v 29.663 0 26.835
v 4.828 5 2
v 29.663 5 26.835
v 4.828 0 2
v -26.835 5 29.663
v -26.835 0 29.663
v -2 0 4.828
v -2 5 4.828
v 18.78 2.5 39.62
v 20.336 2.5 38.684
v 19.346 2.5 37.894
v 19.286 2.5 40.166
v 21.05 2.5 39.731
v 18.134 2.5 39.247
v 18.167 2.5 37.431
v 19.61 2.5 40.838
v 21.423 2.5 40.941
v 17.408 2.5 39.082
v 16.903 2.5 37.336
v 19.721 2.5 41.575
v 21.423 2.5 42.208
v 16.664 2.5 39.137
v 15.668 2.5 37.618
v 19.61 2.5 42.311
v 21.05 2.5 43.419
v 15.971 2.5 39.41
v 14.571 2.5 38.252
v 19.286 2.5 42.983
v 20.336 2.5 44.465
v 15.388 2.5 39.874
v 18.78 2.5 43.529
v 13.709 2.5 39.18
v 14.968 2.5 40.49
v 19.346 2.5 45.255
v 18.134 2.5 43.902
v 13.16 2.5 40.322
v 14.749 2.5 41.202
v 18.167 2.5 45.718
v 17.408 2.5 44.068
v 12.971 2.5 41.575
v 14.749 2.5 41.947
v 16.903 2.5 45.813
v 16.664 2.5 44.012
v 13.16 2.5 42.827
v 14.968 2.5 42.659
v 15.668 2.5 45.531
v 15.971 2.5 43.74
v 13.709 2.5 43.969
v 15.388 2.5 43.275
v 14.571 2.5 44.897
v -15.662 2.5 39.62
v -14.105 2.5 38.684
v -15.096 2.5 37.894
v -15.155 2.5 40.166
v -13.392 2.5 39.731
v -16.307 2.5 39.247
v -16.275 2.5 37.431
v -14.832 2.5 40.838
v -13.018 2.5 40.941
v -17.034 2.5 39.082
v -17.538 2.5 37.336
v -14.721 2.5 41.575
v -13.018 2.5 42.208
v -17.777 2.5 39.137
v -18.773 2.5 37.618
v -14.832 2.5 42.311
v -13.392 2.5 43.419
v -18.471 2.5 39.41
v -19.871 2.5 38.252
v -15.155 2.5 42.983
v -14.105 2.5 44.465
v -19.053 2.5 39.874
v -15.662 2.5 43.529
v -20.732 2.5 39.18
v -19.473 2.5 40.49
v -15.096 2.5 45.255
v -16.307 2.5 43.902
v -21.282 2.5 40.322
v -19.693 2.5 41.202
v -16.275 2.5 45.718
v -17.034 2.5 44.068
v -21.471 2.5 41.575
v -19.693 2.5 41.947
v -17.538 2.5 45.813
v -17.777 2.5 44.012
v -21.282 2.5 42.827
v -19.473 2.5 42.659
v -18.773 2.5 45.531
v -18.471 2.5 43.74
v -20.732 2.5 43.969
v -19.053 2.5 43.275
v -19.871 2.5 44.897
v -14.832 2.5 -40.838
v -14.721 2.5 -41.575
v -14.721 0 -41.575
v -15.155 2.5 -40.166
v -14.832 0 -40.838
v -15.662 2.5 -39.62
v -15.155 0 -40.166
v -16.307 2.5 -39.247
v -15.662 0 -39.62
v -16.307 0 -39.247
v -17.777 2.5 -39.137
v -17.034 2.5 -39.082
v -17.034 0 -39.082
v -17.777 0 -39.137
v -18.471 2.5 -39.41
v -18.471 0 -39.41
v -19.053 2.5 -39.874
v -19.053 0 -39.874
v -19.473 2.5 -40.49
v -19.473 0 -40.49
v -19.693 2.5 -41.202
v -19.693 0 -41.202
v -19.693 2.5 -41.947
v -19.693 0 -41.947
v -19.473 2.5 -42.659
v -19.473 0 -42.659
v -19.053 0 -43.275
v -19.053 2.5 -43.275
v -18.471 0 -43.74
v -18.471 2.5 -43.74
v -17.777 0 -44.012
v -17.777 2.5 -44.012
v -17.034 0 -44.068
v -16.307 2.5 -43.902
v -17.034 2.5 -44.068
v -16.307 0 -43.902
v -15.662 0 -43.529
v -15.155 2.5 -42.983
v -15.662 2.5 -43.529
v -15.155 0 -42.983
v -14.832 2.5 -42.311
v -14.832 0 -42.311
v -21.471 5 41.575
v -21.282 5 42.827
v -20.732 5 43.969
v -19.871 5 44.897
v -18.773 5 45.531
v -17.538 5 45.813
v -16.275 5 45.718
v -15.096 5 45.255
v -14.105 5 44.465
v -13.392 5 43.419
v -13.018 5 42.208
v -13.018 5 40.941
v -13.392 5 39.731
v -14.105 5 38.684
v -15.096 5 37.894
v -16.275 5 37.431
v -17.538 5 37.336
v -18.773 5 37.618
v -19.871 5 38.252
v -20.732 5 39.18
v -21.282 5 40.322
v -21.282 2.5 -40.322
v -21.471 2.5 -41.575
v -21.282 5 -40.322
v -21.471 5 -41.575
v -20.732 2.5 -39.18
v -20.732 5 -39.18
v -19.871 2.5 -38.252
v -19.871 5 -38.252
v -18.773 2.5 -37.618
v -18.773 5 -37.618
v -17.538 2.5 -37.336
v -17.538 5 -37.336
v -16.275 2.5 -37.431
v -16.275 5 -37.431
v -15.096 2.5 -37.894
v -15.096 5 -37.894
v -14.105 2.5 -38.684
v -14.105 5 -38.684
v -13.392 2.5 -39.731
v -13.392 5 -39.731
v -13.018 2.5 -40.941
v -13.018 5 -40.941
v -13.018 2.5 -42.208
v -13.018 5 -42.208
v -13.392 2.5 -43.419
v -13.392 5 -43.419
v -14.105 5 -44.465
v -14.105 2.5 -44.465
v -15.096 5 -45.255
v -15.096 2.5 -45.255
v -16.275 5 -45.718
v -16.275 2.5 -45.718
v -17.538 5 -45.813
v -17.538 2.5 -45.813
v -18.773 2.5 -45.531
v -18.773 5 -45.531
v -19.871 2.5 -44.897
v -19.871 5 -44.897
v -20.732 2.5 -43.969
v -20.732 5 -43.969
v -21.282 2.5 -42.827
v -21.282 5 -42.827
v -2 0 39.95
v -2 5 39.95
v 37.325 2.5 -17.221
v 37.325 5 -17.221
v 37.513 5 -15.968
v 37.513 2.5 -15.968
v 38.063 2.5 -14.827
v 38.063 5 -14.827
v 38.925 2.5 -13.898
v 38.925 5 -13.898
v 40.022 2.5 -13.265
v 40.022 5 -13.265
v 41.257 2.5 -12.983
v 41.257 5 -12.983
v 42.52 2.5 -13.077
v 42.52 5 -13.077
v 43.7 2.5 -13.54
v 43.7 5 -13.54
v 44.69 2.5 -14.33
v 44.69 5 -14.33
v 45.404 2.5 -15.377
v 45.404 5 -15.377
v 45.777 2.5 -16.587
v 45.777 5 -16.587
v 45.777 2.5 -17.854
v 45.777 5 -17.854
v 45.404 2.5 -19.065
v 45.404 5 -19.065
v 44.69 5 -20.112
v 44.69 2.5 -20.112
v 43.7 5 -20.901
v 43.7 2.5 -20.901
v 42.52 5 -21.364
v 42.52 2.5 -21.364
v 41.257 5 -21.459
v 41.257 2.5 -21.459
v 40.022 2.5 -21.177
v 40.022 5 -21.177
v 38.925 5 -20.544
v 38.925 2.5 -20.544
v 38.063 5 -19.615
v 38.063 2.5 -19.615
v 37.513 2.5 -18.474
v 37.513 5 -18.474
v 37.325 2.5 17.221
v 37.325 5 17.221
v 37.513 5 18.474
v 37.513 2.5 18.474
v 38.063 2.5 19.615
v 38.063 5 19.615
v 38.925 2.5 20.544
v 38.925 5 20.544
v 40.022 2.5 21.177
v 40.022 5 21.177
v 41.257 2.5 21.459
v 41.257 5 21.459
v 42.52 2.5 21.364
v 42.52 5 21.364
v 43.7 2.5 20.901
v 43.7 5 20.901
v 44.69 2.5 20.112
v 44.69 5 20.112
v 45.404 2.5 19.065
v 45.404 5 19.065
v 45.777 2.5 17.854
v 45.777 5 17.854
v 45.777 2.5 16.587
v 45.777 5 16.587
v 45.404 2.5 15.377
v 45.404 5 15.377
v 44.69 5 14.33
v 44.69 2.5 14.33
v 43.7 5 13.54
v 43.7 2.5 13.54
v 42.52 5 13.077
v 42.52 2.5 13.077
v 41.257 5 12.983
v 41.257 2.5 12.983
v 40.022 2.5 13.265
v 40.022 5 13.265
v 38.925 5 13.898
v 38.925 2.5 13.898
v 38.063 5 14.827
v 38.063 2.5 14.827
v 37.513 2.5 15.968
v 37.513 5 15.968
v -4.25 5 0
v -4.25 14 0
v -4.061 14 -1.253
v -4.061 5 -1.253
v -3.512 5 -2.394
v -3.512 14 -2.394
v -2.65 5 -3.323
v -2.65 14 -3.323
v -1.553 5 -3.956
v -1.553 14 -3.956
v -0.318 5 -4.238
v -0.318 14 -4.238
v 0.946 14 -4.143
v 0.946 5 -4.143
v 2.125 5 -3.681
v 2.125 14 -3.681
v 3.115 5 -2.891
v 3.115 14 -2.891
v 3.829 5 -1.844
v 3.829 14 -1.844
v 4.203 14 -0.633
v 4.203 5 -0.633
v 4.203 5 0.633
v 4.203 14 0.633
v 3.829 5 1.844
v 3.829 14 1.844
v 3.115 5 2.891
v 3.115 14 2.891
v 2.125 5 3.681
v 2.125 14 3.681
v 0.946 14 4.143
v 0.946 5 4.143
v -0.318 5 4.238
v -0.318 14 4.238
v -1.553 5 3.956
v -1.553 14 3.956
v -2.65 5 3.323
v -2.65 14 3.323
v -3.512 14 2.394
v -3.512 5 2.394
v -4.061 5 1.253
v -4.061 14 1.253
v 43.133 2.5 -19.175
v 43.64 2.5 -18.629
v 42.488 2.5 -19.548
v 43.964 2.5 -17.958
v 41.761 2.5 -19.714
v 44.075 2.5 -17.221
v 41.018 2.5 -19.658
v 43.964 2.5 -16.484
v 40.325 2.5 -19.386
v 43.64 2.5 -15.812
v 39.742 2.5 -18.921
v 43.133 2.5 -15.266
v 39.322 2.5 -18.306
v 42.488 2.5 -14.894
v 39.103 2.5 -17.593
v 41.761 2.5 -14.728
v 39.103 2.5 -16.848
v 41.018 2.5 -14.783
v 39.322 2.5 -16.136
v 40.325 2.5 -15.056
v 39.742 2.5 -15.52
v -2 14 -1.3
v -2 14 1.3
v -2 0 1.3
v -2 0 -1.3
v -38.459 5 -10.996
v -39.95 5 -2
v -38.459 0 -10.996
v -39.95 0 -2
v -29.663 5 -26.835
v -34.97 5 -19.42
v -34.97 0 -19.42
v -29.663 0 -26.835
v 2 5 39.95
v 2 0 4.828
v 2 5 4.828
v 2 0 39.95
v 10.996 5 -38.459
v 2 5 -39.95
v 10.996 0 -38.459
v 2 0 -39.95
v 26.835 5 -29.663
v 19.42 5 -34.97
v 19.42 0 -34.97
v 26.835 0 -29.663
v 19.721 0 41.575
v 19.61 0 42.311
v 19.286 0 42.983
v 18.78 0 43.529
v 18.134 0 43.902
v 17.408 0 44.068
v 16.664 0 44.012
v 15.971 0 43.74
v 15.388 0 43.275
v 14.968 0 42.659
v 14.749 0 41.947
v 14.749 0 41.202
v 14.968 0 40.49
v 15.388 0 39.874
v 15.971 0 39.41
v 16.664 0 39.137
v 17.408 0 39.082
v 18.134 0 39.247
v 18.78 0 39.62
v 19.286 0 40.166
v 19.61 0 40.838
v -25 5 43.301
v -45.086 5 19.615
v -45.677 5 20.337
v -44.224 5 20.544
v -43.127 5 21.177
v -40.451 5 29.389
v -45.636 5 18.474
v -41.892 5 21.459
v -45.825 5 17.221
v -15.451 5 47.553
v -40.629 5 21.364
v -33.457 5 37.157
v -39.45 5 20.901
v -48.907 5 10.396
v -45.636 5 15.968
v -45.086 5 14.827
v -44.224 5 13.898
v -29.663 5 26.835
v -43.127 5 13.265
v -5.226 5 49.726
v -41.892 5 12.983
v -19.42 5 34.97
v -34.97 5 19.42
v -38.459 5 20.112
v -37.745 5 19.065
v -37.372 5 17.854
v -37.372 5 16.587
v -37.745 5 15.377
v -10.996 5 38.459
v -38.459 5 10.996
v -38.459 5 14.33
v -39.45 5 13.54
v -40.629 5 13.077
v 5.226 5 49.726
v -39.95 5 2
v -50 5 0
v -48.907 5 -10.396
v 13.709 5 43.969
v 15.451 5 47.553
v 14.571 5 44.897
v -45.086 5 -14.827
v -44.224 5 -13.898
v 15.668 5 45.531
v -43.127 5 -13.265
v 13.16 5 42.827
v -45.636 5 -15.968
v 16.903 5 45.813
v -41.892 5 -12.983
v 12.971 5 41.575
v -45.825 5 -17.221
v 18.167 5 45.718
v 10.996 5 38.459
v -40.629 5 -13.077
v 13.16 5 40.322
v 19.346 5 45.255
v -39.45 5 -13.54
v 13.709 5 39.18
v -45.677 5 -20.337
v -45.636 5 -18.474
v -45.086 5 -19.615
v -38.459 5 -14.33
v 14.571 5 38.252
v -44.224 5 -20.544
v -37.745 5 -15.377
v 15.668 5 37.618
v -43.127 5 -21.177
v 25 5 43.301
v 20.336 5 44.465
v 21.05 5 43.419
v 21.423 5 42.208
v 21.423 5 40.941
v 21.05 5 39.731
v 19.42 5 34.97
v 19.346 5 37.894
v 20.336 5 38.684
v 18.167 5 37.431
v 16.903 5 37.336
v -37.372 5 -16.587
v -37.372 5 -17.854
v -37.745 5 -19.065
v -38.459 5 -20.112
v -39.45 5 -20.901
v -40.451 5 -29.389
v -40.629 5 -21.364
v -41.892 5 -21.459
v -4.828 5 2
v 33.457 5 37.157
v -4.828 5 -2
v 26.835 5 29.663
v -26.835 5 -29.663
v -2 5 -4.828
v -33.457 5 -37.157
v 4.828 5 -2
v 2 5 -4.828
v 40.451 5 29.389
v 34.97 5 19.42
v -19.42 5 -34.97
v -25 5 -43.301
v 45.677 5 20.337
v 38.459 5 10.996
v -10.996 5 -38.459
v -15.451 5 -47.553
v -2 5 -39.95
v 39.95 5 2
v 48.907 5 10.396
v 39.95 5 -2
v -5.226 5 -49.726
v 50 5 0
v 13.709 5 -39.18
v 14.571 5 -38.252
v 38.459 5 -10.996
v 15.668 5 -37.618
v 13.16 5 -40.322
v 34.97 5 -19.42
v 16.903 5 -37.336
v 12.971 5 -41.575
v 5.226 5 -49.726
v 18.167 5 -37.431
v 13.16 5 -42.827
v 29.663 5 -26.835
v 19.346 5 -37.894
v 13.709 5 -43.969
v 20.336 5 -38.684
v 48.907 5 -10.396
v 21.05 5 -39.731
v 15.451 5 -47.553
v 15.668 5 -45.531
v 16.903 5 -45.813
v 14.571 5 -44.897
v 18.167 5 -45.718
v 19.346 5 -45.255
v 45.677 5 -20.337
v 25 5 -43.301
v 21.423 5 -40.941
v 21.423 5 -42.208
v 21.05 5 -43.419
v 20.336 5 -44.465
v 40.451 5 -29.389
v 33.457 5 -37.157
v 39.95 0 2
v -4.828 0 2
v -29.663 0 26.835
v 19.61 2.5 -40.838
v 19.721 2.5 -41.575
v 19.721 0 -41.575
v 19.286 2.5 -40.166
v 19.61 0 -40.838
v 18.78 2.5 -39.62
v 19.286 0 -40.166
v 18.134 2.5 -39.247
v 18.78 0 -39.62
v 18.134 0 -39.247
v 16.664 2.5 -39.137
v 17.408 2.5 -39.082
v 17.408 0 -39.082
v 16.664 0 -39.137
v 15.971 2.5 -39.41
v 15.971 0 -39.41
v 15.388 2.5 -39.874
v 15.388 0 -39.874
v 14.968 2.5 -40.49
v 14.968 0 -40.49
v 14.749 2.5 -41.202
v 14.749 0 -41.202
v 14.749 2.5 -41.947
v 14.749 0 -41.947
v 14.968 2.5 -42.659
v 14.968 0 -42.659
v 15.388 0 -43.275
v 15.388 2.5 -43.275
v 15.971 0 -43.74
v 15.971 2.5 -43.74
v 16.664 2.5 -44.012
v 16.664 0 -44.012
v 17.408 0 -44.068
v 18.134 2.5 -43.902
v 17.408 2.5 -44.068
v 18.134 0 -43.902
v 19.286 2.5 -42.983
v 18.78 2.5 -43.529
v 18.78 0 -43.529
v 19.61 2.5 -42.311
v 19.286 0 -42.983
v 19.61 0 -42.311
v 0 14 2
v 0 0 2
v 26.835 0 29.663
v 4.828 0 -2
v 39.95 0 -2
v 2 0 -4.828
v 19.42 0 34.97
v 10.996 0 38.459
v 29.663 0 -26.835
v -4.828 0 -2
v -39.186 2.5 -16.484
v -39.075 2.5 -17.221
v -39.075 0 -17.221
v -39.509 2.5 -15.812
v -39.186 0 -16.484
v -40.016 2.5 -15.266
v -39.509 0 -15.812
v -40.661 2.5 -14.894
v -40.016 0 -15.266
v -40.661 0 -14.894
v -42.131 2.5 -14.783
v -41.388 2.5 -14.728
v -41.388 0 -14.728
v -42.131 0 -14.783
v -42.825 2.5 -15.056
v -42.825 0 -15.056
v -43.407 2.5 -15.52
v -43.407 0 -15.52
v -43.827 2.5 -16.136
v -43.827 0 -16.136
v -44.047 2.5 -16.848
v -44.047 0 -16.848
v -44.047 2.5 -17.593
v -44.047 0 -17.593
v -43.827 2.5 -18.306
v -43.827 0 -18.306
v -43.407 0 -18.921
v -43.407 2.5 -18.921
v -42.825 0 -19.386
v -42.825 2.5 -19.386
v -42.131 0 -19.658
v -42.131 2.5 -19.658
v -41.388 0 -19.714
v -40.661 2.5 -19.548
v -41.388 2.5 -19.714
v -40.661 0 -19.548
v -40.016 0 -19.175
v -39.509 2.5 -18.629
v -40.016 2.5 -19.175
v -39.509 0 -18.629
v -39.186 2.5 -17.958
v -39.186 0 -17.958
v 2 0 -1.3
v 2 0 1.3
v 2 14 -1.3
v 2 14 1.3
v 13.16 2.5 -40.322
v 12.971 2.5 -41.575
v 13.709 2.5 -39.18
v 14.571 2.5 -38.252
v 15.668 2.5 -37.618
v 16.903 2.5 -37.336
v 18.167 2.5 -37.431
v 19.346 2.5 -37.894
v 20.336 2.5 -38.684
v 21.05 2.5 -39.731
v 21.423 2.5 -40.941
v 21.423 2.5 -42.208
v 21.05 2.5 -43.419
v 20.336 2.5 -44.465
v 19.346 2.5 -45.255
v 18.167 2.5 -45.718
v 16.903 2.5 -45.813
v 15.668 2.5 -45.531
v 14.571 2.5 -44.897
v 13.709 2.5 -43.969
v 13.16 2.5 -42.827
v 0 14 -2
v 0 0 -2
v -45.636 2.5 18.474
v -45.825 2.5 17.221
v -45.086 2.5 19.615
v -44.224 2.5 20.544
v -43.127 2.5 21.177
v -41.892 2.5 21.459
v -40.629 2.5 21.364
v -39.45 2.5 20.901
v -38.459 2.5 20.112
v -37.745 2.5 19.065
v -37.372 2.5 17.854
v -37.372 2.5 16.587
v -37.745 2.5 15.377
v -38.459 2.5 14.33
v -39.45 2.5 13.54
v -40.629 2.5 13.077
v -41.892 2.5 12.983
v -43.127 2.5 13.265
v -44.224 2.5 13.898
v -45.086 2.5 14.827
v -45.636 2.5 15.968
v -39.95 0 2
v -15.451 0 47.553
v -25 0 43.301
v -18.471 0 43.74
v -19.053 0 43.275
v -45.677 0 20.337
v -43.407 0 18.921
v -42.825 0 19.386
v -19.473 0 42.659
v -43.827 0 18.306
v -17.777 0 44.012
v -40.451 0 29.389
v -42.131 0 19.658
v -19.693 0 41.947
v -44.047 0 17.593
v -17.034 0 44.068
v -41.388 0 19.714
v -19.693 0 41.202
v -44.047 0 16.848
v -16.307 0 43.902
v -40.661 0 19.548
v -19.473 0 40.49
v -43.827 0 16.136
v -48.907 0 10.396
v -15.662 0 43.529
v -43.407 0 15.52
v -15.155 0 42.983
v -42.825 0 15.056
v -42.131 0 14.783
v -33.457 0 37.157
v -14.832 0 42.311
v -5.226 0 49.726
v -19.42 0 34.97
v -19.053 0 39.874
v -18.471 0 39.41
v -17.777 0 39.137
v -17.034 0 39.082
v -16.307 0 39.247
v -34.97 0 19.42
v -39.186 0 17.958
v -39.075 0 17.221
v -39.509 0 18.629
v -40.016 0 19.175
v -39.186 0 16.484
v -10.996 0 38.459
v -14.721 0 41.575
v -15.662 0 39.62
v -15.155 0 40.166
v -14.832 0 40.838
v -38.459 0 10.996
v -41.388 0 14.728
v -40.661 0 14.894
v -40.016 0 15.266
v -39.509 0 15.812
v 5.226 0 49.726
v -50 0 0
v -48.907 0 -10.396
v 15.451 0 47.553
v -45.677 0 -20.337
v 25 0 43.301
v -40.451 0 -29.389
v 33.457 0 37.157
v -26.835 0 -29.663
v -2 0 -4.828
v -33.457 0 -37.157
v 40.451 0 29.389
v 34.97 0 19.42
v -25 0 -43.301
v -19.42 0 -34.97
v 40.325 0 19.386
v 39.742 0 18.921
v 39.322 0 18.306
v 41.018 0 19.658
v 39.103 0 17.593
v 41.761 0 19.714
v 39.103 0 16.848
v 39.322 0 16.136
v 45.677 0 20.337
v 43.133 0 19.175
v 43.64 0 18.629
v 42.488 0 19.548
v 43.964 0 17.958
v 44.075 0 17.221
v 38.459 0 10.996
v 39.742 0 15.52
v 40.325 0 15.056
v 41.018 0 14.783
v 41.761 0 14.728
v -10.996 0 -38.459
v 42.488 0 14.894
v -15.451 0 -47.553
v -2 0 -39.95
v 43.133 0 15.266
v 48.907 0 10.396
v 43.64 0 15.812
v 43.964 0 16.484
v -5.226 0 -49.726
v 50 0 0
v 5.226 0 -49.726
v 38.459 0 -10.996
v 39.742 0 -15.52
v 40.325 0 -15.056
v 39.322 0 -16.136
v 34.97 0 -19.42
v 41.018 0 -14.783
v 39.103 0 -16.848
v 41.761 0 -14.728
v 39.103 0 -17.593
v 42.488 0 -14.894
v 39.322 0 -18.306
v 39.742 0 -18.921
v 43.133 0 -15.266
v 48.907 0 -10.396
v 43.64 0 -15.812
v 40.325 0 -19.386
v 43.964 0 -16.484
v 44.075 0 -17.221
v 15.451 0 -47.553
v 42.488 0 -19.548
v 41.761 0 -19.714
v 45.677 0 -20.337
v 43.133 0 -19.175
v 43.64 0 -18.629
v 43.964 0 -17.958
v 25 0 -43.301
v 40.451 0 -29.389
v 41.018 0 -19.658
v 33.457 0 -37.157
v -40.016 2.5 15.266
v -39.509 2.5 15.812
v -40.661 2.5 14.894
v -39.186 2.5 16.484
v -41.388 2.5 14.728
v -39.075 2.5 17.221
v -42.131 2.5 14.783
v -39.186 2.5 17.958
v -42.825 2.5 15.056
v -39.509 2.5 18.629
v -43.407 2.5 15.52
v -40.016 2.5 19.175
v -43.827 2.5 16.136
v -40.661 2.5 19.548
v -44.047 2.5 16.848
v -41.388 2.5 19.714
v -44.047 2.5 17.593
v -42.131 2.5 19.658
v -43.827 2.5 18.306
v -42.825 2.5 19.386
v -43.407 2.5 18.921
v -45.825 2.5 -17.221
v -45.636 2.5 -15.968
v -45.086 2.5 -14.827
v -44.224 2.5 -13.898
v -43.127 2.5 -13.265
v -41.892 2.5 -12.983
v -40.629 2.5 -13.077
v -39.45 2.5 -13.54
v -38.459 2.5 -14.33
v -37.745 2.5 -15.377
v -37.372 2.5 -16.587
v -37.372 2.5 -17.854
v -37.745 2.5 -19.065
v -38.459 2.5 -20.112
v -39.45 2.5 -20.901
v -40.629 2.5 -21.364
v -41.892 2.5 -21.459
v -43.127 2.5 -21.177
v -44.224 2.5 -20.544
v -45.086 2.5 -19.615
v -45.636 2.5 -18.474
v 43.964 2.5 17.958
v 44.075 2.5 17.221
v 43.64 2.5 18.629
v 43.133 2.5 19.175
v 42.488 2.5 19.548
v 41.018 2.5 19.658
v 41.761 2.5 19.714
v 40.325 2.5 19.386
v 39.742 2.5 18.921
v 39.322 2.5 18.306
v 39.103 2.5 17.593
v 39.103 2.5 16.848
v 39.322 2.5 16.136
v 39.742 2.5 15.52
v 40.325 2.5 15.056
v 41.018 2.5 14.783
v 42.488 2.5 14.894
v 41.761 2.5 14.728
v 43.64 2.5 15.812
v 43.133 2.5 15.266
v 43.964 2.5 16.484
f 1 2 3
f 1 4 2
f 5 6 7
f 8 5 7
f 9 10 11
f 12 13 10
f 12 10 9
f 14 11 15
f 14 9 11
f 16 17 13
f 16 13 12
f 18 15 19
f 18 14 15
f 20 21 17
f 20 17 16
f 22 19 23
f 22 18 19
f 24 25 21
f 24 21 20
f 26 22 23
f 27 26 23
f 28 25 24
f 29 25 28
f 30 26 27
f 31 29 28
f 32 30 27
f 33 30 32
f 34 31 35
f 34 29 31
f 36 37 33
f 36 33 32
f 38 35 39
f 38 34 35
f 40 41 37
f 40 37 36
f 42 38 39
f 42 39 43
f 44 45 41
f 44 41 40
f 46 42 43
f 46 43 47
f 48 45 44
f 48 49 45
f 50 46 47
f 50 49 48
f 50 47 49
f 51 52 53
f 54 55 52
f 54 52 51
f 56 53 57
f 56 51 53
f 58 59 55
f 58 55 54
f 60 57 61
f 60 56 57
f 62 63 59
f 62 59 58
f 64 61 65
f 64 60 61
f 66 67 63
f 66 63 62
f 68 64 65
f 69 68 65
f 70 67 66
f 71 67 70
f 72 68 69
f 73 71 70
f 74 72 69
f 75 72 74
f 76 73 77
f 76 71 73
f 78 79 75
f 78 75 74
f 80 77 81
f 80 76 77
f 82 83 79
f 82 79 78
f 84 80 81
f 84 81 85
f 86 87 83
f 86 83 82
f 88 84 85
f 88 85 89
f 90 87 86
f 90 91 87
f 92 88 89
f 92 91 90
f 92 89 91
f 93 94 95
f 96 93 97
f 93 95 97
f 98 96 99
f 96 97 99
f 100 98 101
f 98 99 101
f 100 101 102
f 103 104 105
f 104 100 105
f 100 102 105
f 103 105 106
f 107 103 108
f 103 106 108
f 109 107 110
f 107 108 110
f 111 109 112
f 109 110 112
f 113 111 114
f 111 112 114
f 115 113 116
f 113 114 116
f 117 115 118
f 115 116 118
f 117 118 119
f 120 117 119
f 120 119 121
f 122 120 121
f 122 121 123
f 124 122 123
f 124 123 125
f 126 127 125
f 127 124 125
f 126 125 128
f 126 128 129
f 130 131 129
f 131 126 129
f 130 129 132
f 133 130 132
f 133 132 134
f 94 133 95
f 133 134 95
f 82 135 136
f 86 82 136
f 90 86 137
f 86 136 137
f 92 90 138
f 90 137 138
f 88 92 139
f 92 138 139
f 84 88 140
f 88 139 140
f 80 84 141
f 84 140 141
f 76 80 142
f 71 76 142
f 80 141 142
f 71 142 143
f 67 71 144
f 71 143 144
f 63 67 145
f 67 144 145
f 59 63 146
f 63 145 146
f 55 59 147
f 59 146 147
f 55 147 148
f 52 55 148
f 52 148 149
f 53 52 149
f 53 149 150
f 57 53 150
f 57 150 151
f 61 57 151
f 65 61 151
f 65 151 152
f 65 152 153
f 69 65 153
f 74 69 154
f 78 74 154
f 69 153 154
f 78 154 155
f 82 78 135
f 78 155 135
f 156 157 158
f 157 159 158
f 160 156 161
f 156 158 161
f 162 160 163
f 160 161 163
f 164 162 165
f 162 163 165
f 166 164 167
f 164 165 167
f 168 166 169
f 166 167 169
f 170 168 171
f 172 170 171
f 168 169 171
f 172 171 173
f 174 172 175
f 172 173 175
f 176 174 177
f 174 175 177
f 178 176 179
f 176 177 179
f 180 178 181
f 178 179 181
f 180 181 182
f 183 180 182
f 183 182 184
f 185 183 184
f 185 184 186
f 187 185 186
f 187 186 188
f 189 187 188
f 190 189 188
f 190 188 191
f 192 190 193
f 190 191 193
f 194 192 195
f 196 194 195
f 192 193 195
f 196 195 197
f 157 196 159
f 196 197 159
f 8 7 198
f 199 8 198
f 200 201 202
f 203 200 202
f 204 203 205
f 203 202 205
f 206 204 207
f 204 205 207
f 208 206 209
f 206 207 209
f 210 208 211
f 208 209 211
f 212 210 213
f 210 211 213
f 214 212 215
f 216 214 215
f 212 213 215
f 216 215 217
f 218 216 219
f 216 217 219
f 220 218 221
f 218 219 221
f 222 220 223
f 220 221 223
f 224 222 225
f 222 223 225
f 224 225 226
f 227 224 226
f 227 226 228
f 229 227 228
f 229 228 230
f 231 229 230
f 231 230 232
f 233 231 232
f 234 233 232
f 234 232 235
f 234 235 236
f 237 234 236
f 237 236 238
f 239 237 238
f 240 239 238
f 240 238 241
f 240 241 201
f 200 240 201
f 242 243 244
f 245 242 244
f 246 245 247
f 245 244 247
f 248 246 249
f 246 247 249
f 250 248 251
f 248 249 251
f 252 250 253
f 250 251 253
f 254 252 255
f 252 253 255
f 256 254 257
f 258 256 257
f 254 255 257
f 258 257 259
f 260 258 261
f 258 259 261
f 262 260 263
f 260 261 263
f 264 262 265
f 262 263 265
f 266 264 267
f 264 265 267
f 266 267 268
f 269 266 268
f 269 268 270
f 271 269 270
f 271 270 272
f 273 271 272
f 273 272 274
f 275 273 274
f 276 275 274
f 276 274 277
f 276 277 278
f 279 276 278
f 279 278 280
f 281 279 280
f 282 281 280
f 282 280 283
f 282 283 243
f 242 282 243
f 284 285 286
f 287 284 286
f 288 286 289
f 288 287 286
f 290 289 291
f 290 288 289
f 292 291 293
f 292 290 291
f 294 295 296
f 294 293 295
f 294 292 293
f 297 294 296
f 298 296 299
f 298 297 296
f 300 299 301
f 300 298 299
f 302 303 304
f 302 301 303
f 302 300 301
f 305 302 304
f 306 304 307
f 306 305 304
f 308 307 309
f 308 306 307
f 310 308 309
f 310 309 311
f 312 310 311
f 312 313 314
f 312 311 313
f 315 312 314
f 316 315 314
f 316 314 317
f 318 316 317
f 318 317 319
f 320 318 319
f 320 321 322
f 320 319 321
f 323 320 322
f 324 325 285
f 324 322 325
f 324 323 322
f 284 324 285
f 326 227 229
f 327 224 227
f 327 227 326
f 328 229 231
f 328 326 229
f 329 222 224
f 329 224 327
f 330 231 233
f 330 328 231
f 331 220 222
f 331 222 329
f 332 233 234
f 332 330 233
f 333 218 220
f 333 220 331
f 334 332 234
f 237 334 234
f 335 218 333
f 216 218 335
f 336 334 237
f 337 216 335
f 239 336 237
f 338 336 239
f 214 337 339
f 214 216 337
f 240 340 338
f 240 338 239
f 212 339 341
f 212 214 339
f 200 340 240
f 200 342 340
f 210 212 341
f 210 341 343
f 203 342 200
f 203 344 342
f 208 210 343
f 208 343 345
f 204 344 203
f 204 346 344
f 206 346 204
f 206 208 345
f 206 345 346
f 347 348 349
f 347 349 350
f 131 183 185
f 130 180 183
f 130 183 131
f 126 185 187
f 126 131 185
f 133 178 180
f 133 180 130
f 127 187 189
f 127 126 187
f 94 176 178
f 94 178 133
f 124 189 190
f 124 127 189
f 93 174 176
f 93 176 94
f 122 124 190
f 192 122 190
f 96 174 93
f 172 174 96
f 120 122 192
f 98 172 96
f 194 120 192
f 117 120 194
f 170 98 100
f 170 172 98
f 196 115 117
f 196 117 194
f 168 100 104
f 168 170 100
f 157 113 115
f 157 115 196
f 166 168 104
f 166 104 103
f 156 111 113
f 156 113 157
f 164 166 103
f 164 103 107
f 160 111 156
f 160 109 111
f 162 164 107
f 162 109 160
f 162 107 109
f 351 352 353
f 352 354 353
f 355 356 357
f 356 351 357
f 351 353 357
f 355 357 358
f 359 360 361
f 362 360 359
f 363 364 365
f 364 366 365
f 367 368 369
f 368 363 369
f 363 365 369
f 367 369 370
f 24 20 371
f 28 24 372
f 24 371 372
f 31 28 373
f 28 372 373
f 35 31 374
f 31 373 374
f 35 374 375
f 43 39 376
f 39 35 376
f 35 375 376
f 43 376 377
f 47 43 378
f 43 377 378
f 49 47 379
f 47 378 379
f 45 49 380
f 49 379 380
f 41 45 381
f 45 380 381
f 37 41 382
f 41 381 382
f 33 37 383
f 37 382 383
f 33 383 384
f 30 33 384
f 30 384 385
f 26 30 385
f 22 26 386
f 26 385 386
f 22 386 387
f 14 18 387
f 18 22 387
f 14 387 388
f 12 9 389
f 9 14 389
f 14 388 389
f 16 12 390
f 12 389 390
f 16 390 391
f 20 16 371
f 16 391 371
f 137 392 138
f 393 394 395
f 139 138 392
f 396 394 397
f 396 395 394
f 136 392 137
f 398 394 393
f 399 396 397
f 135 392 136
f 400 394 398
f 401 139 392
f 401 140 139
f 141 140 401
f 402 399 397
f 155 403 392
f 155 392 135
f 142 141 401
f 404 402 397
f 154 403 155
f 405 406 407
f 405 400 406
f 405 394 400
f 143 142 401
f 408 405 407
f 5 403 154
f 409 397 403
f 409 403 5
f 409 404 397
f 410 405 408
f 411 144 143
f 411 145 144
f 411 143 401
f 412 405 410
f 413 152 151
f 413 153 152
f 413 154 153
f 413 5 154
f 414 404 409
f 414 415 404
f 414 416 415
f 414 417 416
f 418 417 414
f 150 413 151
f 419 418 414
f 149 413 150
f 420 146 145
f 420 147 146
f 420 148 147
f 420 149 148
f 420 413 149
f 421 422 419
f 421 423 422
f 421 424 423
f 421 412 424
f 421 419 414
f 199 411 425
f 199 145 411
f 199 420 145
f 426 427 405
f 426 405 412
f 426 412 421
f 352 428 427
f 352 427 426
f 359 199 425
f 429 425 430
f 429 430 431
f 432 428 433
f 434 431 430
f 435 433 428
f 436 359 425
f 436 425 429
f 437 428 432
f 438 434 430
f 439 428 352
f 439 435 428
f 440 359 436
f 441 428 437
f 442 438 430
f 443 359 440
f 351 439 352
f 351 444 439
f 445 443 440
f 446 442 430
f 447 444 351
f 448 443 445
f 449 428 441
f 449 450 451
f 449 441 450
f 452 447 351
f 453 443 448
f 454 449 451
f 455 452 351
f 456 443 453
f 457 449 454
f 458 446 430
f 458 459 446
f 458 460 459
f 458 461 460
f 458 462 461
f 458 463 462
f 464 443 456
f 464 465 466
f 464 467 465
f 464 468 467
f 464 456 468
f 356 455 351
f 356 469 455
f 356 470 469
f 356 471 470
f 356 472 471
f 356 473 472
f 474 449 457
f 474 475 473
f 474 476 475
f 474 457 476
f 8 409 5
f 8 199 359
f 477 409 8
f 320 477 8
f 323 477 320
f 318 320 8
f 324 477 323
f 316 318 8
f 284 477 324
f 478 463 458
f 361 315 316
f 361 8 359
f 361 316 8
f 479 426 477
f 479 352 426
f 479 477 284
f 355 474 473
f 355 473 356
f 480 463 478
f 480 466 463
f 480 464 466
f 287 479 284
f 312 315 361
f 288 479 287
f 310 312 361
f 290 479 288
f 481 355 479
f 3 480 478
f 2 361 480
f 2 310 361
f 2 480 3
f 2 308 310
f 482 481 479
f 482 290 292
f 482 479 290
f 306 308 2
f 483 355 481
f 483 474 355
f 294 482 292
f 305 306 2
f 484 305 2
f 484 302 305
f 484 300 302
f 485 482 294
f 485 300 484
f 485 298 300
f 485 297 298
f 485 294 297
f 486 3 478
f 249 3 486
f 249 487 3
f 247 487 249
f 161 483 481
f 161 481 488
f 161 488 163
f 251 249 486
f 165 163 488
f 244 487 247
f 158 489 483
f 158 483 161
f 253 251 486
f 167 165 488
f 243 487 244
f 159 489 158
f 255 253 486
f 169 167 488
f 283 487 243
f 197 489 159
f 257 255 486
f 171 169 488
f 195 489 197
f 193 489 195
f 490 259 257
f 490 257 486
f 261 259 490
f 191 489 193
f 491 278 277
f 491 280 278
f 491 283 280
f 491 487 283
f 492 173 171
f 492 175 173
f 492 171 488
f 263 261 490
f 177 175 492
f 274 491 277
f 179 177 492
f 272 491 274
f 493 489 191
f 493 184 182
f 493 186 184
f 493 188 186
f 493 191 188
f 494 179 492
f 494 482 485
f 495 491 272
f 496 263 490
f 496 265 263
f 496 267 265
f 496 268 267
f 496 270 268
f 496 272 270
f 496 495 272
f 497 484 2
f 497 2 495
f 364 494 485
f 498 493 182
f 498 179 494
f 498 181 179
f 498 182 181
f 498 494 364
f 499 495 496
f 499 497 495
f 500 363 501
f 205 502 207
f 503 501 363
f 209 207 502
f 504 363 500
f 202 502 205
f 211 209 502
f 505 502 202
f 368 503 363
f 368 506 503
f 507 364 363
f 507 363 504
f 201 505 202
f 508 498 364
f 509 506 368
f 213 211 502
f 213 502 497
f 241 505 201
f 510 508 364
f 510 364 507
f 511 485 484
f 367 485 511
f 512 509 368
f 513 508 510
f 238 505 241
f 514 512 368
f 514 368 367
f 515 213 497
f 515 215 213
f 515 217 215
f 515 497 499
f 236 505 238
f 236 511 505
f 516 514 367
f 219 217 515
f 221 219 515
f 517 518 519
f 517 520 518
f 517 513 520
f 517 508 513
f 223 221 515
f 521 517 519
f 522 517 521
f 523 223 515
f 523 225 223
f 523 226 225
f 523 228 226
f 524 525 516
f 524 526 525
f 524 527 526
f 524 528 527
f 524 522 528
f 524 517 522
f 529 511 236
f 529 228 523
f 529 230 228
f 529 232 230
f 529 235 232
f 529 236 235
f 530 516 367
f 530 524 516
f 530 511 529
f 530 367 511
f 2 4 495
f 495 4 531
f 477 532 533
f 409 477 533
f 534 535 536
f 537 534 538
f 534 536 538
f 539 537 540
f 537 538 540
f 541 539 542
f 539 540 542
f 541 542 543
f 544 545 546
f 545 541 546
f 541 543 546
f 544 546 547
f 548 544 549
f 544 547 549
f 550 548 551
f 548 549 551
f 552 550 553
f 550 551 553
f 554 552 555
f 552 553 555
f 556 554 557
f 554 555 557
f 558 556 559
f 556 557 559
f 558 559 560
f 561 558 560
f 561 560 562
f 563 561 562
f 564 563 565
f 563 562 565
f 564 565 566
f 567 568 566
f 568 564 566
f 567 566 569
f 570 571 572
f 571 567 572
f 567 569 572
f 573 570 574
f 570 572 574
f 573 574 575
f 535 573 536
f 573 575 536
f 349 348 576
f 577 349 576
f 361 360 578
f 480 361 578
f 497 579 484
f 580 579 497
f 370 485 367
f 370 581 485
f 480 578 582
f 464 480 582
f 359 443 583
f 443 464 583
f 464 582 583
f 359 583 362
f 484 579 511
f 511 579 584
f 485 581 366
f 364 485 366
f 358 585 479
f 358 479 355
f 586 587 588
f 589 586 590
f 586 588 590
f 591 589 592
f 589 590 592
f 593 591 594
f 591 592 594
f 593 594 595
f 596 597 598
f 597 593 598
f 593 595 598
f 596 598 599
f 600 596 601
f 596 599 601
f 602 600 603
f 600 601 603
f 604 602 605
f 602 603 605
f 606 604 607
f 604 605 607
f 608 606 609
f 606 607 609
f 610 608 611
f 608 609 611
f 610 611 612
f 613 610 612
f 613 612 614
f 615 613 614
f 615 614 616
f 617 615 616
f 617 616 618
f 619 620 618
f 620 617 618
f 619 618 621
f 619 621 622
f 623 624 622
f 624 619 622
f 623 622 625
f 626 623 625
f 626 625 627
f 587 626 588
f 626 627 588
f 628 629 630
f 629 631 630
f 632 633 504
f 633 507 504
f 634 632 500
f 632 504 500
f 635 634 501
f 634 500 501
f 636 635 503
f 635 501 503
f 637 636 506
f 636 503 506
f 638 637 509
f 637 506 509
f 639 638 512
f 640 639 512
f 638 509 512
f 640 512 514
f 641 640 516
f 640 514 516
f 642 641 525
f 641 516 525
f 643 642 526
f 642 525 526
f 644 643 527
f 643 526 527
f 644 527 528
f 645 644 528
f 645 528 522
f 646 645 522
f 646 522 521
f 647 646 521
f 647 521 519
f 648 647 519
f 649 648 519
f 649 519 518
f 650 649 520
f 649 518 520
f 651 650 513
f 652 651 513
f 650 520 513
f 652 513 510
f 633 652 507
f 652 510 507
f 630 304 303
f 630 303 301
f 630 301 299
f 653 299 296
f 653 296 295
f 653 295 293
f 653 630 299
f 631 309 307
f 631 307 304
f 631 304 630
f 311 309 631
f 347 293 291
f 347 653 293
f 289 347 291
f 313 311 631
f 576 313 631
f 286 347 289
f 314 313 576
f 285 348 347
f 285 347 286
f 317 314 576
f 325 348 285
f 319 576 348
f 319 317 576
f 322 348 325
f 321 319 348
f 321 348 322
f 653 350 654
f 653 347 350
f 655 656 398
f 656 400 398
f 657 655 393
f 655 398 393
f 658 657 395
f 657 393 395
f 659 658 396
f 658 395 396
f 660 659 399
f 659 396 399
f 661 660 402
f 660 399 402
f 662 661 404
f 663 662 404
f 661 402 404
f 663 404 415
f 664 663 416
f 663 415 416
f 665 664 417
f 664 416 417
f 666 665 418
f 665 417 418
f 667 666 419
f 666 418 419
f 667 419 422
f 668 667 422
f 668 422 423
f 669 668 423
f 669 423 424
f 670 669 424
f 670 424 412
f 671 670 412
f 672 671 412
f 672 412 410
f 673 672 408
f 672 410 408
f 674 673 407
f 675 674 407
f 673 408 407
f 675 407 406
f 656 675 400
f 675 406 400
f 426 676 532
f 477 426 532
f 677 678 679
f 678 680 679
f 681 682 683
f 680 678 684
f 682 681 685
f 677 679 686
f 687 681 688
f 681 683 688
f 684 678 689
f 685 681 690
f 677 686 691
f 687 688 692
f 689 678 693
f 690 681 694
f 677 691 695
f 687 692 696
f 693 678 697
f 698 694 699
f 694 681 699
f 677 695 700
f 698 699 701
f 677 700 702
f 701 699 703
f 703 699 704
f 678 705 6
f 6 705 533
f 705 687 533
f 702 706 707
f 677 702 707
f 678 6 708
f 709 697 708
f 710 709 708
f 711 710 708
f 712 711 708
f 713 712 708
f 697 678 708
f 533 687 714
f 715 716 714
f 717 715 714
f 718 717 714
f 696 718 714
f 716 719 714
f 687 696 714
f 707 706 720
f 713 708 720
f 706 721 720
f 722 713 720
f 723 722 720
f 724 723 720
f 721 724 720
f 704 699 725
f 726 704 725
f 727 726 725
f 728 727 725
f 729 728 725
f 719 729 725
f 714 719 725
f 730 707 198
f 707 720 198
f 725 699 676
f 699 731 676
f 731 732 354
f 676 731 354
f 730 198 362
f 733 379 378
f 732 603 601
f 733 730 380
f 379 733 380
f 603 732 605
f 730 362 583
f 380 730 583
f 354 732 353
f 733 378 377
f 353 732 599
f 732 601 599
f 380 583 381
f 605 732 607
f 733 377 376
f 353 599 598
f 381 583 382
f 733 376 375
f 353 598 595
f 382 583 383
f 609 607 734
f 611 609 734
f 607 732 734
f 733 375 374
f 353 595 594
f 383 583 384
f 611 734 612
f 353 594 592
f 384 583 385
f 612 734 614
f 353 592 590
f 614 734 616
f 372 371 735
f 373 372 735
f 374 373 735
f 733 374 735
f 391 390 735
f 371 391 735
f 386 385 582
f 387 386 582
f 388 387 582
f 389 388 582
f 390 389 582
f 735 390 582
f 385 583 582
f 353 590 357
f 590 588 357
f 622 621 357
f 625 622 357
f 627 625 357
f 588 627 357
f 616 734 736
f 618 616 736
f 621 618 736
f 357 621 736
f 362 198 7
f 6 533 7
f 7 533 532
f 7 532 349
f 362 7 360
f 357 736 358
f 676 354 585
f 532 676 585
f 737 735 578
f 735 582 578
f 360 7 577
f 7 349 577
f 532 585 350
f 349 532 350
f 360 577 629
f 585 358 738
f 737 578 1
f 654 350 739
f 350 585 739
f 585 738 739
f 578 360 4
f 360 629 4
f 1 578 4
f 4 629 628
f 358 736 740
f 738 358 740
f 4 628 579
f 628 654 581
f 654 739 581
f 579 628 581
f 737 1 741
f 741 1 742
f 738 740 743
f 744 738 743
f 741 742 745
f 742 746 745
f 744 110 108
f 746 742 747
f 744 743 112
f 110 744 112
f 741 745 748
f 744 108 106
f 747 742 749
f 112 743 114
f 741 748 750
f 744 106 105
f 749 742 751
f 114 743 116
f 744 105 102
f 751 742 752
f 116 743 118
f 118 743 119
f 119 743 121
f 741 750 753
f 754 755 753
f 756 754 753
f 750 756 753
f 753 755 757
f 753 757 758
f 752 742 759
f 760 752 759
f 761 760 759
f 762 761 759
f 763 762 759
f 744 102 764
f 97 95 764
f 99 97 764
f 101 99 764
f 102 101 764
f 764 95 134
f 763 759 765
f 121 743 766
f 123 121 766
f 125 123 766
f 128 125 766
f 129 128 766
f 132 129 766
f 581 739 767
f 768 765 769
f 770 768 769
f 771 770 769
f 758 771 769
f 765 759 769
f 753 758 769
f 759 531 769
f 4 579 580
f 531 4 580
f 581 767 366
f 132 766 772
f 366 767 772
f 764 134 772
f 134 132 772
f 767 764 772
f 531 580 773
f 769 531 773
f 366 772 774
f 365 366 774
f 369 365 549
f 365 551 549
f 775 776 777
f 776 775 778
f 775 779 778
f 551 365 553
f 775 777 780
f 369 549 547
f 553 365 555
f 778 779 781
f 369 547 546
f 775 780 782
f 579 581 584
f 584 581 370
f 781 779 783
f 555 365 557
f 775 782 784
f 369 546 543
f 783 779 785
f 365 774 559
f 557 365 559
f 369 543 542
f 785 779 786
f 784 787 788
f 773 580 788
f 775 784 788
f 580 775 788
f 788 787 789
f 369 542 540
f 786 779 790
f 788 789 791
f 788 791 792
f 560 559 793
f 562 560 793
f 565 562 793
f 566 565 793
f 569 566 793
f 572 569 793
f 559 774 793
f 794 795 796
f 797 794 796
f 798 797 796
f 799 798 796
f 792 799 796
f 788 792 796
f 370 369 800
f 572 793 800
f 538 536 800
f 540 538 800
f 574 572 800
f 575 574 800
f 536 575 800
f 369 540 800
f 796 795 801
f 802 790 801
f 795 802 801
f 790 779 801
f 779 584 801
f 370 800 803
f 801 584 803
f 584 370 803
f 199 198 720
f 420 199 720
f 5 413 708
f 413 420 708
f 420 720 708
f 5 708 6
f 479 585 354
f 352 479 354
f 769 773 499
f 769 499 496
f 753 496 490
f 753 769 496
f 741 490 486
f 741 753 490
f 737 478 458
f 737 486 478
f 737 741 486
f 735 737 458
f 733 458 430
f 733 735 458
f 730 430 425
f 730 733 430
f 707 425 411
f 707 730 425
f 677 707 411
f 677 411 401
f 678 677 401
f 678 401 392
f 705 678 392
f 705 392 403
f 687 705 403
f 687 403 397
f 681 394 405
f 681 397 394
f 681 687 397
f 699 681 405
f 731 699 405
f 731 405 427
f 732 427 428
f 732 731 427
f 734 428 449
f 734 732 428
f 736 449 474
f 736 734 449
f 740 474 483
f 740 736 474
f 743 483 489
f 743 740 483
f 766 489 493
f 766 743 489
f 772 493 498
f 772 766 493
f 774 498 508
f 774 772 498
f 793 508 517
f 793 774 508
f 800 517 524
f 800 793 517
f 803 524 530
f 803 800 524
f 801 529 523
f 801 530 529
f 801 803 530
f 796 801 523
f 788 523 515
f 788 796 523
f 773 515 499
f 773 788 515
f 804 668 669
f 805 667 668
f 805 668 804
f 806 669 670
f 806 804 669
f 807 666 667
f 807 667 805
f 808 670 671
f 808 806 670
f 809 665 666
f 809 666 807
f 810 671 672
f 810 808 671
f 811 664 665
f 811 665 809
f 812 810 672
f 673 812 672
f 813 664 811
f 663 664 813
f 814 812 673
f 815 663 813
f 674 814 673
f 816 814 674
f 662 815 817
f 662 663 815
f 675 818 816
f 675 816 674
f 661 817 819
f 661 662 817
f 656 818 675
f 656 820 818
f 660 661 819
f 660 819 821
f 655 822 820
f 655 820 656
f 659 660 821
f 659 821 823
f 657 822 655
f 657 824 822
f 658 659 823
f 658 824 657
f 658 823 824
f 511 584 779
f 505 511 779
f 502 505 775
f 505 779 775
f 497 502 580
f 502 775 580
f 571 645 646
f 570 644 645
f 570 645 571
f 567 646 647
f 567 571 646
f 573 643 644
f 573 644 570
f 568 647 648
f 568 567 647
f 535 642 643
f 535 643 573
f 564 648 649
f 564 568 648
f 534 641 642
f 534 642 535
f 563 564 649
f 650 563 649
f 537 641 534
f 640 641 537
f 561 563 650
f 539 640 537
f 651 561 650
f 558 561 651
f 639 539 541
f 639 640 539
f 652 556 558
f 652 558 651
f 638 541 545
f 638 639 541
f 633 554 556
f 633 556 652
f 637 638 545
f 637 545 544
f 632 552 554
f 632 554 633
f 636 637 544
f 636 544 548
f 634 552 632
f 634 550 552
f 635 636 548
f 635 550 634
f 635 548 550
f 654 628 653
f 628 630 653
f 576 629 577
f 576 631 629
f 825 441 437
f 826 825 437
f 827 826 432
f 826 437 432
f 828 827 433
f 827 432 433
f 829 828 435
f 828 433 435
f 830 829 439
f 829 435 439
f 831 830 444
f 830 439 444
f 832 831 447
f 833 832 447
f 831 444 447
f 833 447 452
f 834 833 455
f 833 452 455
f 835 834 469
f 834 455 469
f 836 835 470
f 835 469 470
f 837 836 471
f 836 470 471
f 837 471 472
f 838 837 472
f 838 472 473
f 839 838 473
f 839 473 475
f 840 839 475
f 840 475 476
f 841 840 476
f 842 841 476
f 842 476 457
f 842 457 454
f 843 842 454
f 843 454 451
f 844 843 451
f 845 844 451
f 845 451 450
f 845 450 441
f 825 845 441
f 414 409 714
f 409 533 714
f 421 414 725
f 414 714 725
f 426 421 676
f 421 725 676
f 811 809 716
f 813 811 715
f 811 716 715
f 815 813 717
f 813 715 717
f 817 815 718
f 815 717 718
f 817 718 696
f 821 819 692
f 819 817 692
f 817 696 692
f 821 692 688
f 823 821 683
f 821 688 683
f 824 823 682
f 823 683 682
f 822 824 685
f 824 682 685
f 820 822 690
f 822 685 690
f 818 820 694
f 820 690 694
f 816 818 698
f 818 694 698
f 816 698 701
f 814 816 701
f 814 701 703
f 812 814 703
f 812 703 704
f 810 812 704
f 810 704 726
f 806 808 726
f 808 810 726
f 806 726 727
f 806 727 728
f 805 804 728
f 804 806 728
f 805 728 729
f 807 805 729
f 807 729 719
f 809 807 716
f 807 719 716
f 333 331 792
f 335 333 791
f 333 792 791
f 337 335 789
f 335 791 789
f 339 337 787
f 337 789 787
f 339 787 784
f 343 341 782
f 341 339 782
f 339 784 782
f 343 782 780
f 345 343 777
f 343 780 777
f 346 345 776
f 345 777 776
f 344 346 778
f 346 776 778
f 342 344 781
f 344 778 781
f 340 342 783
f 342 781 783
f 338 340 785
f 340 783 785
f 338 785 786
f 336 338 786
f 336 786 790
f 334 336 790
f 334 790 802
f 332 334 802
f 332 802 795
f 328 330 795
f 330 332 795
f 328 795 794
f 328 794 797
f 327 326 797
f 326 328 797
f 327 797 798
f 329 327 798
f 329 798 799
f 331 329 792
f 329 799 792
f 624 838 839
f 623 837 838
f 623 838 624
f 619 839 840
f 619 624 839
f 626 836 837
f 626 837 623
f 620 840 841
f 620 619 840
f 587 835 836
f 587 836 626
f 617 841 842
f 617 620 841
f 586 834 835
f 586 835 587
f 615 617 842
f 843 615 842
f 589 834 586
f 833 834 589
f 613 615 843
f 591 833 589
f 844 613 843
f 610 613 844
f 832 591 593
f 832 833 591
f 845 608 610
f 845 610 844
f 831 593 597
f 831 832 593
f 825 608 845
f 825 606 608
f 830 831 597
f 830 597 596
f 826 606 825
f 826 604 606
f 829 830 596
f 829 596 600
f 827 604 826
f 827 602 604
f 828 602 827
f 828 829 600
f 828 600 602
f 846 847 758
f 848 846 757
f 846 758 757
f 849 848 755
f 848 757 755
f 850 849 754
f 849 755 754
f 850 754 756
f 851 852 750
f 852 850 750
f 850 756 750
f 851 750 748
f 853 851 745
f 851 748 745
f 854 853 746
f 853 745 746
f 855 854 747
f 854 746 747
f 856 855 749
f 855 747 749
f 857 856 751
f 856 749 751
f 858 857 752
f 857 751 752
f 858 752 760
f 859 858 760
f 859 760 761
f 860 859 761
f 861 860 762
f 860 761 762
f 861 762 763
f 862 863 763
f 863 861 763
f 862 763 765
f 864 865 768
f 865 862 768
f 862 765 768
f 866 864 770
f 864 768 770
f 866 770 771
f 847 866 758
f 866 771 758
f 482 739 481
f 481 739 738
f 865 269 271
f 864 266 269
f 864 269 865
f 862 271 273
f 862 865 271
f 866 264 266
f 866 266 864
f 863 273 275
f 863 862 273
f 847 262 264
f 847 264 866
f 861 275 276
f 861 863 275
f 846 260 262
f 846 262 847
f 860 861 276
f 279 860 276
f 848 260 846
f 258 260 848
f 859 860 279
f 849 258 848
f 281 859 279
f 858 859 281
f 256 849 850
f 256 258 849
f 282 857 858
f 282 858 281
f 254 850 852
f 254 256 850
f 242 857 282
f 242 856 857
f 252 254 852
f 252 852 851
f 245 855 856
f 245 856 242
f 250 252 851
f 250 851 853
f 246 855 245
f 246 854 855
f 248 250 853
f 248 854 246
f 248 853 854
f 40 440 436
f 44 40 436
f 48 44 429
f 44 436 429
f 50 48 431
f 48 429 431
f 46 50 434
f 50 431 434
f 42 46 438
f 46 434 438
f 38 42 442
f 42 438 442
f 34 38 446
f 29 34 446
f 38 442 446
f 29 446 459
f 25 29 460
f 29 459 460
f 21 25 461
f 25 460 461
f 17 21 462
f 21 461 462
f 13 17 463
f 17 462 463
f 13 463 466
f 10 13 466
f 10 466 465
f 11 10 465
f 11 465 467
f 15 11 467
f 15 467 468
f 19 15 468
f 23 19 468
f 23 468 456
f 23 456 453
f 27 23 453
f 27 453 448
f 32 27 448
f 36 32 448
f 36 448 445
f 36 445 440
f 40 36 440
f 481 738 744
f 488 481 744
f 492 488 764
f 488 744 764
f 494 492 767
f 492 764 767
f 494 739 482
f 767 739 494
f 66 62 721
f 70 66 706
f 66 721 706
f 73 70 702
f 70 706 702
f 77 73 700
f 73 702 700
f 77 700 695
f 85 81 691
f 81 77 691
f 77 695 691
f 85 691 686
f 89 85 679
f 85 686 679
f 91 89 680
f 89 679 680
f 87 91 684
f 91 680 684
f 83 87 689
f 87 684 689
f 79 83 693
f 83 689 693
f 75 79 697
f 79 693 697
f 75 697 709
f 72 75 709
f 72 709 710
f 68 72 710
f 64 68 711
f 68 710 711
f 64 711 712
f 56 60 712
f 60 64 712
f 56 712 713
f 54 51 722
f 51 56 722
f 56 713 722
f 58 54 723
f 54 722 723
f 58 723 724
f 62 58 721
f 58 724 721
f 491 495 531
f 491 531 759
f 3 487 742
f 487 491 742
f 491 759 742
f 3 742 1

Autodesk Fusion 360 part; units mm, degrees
sketch "Sketch1" plane through (0, 0, 0) normal (0, 1, 0) x (1, 0, 0) in component "Circle Out"
  circle A0 centre (0, 0) radius 50
  circle A1 centre (0, 0) radius 40
  circle A2 centre (0, 0) radius 4.5
  line L0 (11.5858, -14.4142) -> (2, -4.8284)
  line L1 (2, -20) -> (2, -39.95)
  line L2 (11.5858, -14.4142) -> (26.8347, -29.6631)
  line L3 (-2, -20) -> (-2, -39.95)
  line L4 (14.4142, -11.5858) -> (29.6631, -26.8347)
  line L5 (24, -2) -> (4.8284, -2)
  line L6 (24, -2) -> (39.95, -2)
  line L7 (24, 2) -> (39.95, 2)
  line L8 (16.7362, 13.9078) -> (4.8284, 2)
  line L9 (16.7362, 13.9078) -> (29.6631, 26.8347)
  line L10 (13.9078, 16.7362) -> (26.8347, 29.6631)
  line L11 (2, 15) -> (2, 4.8284)
  line L12 (2, 15) -> (2, 39.95)
  line L13 (-2, 15) -> (-2, 39.95)
  line L14 (-8.5858, 11.4142) -> (-2, 4.8284)
  line L15 (-8.5858, 11.4142) -> (-26.8347, 29.6631)
  line L16 (-11.4142, 8.5858) -> (-11.591, 8.7626)
  line L17 (-11.591, 8.7626) -> (-29.6631, 26.8347)
  line L18 (-14, 2) -> (-4.8284, 2)
  line L19 (-14, 2) -> (-39.95, 2)
  line L20 (-14, -2) -> (-39.95, -2)
  line L21 (-13.0052, -10.1768) -> (-4.8284, -2)
  line L22 (-13.0052, -10.1768) -> (-29.6631, -26.8347)
  line L23 (-10.1768, -13.0052) -> (-26.8347, -29.6631)
  line L24 (-10.1768, -13.0052) -> (-2, -4.8284)
  line L25 (-2, -4.8284) -> (-2, -39.95)
  line L26 (2, -4.8284) -> (2, -20)
  line L27 (4.8284, -2) -> (14.4142, -11.5858)
  line L28 (4.8284, 2) -> (24, 2)
  line L29 (2, 4.8284) -> (13.9078, 16.7362)
  line L30 (-2, 4.8284) -> (-2, 15)
  line L31 (-4.8284, 2) -> (-11.4142, 8.5858)
  line L32 (-14, -2) -> (-4.8284, -2)
  dimension "d2" = 100
  dimension "d3" = 9
extrude "Extrude1" add sketch "Sketch1" along normal blind 5 contours A0 | A1 L0 L1 L2 L3 L4 L5 L6 L7 L8 L9 L10 L11 L12 L13 L14 L15 L16 L17 L18 L19 L20 L21 L22 L23 L24 L25 L26 L27 L28 L29 L30 L31 L32 | A2 in component "Circle Out"
sketch "Sketch2" plane through (0, 5, 0) normal (0, 1, 0) x (-1, 0, 0) in component "Circle Out"
  line L0 (4.8284, -2) -> (39.95, -2)
  arc A0 (29.6631, -26.8347) -> (39.95, -2) centre (0, 0) ccw
  line L1 (29.6631, -26.8347) -> (4.8284, -2)
  line L2 (-2, -4.8284) -> (-2, -39.95)
  arc A1 (-26.8347, -29.6631) -> (-2, -39.95) centre (0, 0) ccw
  line L3 (-26.8347, -29.6631) -> (-2, -4.8284)
  line L4 (2, -4.8284) -> (26.8347, -29.6631)
  arc A2 (2, -39.95) -> (26.8347, -29.6631) centre (0, 0) ccw
  line L5 (2, -39.95) -> (2, -4.8284)
  line L6 (-4.8284, -2) -> (-29.6631, -26.8347)
  arc A3 (-39.95, -2) -> (-29.6631, -26.8347) centre (0, 0) ccw
  line L7 (-39.95, -2) -> (-4.8284, -2)
  arc A4 (39.95, 2) -> (29.6631, 26.8347) centre (0, 0) ccw
  line L8 (39.95, 2) -> (4.8284, 2)
  line L9 (4.8284, 2) -> (29.6631, 26.8347)
  line L10 (-4.8284, 2) -> (-39.95, 2)
  arc A5 (-29.6631, 26.8347) -> (-39.95, 2) centre (0, 0) ccw
  line L11 (-29.6631, 26.8347) -> (-4.8284, 2)
  line L12 (26.8347, 29.6631) -> (2, 4.8284)
  line L13 (2, 4.8284) -> (2, 39.95)
  arc A6 (26.8347, 29.6631) -> (2, 39.95) centre (0, 0) ccw
  line L14 (-2, 4.8284) -> (-26.8347, 29.6631)
  arc A7 (-2, 39.95) -> (-26.8347, 29.6631) centre (0, 0) ccw
  line L15 (-2, 39.95) -> (-2, 4.8284)
  circle A8 centre (0, 0) radius 50
  circle A9 centre (0, 0) radius 4.25
  dimension "d25" = 8.5
extrude "Extrude2" add sketch "Sketch2" along normal blind 9 contours A9 in component "Circle Out"
sketch "Sketch3" plane through (0, 14, 0) normal (0, 1, 0) x (-1, 0, 0) in component "Circle Out"
  circle A0 centre (0, 0) radius 4.25
  line L0 (-2, 0) -> (-2, 1.3)
  line L1 (-2, 1.3) -> (0, 2)
  line L2 (2, 0) -> (2, 1.3)
  line L3 (2, 1.3) -> (0, 2)
  line L4 (-2, 0) -> (-2, -1.3)
  line L5 (-2, -1.3) -> (0, -2)
  line L6 (2, 0) -> (2, -1.3)
  line L7 (2, -1.3) -> (0, -2)
extrude "Extrude3" cut sketch "Sketch3" against normal blind 16 contours L0 L1 L2 L3 L4 L5 L6 L7 in component "Circle Out"
sketch "Sketch4" plane through (0, 0, 0) normal (0, -1, 0) x (1, 0, 0) in component "Circle Out"
  line L0 (-2, 1.3) -> (0, 2)
  line L1 (0, 2) -> (2, 1.3)
  line L2 (2, 1.3) -> (2, -1.3)
  line L3 (2, -1.3) -> (0, -2)
  line L4 (0, -2) -> (-2, -1.3)
  line L5 (-2, -1.3) -> (-2, 1.3)
  line L6 (-39.95, -2) -> (-4.8284, -2)
  line L7 (-4.8284, -2) -> (-29.6631, -26.8347)
  arc A0 (-39.95, -2) -> (-29.6631, -26.8347) centre (0, 0) ccw
  line L8 (2, -39.95) -> (2, -4.8284)
  line L9 (2, -4.8284) -> (26.8347, -29.6631)
  arc A1 (2, -39.95) -> (26.8347, -29.6631) centre (0, 0) ccw
  line L10 (-26.8347, -29.6631) -> (-2, -4.8284)
  line L11 (-2, -4.8284) -> (-2, -39.95)
  arc A2 (-26.8347, -29.6631) -> (-2, -39.95) centre (0, 0) ccw
  line L12 (29.6631, -26.8347) -> (4.8284, -2)
  line L13 (4.8284, -2) -> (39.95, -2)
  arc A3 (29.6631, -26.8347) -> (39.95, -2) centre (0, 0) ccw
  arc A4 (-29.6631, 26.8347) -> (-39.95, 2) centre (0, 0) ccw
  line L14 (-29.6631, 26.8347) -> (-4.8284, 2)
  line L15 (-4.8284, 2) -> (-39.95, 2)
  line L16 (39.95, 2) -> (4.8284, 2)
  line L17 (4.8284, 2) -> (29.6631, 26.8347)
  arc A5 (39.95, 2) -> (29.6631, 26.8347) centre (0, 0) ccw
  line L18 (-2, 4.8284) -> (-26.8347, 29.6631)
  arc A6 (-2, 39.95) -> (-26.8347, 29.6631) centre (0, 0) ccw
  line L19 (-2, 39.95) -> (-2, 4.8284)
  line L20 (26.8347, 29.6631) -> (2, 4.8284)
  line L21 (2, 4.8284) -> (2, 39.95)
  arc A7 (26.8347, 29.6631) -> (2, 39.95) centre (0, 0) ccw
  circle A8 centre (0, 0) radius 50
  circle A9 centre (-17.2208, 41.5746) radius 2.5
  circle A10 centre (-41.5746, 17.2208) radius 2.5
  circle A11 centre (-41.5746, -17.2208) radius 2.5
  circle A12 centre (-17.2208, -41.5746) radius 2.5
  circle A13 centre (17.2208, -41.5746) radius 2.5
  circle A14 centre (41.5746, -17.2208) radius 2.5
  circle A15 centre (41.5746, 17.2208) radius 2.5
  circle A16 centre (17.2208, 41.5746) radius 2.5
  dimension "d32" = 5
  dimension "d33" = 5
  dimension "d34" = 5
  dimension "d35" = 5
  dimension "d36" = 5
  dimension "d37" = 5
  dimension "d38" = 5
  dimension "d39" = 5
extrude "Extrude4" cut sketch "Sketch4" against normal blind 10 contours A9 | A10 | A11 | A12 | A13 | A14 | A15 | A16 in component "Circle Out"
sketch "Sketch5" plane through (0, 5, 0) normal (0, 1, 0) x (-1, 0, 0) in component "Circle Out"
  circle A0 centre (-41.5746, 17.2208) radius 2.5
  circle A1 centre (41.5746, -17.2208) radius 2.5
  circle A2 centre (17.2208, -41.5746) radius 2.5
  circle A3 centre (-17.2208, 41.5746) radius 2.5
  circle A4 centre (-41.5746, -17.2208) radius 2.5
  circle A5 centre (41.5746, 17.2208) radius 2.5
  circle A6 centre (-17.2208, -41.5746) radius 2.5
  circle A7 centre (17.2208, 41.5746) radius 2.5
  circle A8 centre (0, 0) radius 4.25
  line L0 (4.8284, -2) -> (39.95, -2)
  arc A9 (29.6631, -26.8347) -> (39.95, -2) centre (0, 0) ccw
  line L1 (29.6631, -26.8347) -> (4.8284, -2)
  line L2 (-2, -4.8284) -> (-2, -39.95)
  arc A10 (-26.8347, -29.6631) -> (-2, -39.95) centre (0, 0) ccw
  line L3 (-26.8347, -29.6631) -> (-2, -4.8284)
  line L4 (2, -4.8284) -> (26.8347, -29.6631)
  arc A11 (2, -39.95) -> (26.8347, -29.6631) centre (0, 0) ccw
  line L5 (2, -39.95) -> (2, -4.8284)
  line L6 (-4.8284, -2) -> (-29.6631, -26.8347)
  arc A12 (-39.95, -2) -> (-29.6631, -26.8347) centre (0, 0) ccw
  line L7 (-39.95, -2) -> (-4.8284, -2)
  arc A13 (39.95, 2) -> (29.6631, 26.8347) centre (0, 0) ccw
  line L8 (39.95, 2) -> (4.8284, 2)
  line L9 (4.8284, 2) -> (29.6631, 26.8347)
  line L10 (-4.8284, 2) -> (-39.95, 2)
  arc A14 (-29.6631, 26.8347) -> (-39.95, 2) centre (0, 0) ccw
  line L11 (-29.6631, 26.8347) -> (-4.8284, 2)
  line L12 (26.8347, 29.6631) -> (2, 4.8284)
  line L13 (2, 4.8284) -> (2, 39.95)
  arc A15 (26.8347, 29.6631) -> (2, 39.95) centre (0, 0) ccw
  line L14 (-2, 4.8284) -> (-26.8347, 29.6631)
  arc A16 (-2, 39.95) -> (-26.8347, 29.6631) centre (0, 0) ccw
  line L15 (-2, 39.95) -> (-2, 4.8284)
  circle A17 centre (0, 0) radius 50
  circle A18 centre (-17.2208, 41.5746) radius 4.25
  circle A19 centre (17.2208, 41.5746) radius 4.25
  circle A20 centre (-41.5746, 17.2208) radius 4.25
  circle A21 centre (-41.5746, -17.2208) radius 4.25
  circle A22 centre (-17.2208, -41.5746) radius 4.25
  circle A23 centre (17.2208, -41.5746) radius 4.25
  circle A24 centre (41.5746, -17.2208) radius 4.25
  circle A25 centre (41.5746, 17.2208) radius 4.25
  dimension "d42" = 8.5
  dimension "d43" = 8.5
  dimension "d44" = 8.5
  dimension "d45" = 8.5
  dimension "d46" = 8.5
  dimension "d47" = 8.5
  dimension "d48" = 8.5
  dimension "d49" = 8.5
extrude "Extrude5" cut sketch "Sketch5" against normal blind 2.5 contours A18 | A19 | A20 | A21 | A22 | A23 | A24 | A25 in component "Circle Out"
component "Circle Out" placed x (1, 0, 0) y (0, 1, 0) z (0, 0, 1) at (0, 0, 0)
